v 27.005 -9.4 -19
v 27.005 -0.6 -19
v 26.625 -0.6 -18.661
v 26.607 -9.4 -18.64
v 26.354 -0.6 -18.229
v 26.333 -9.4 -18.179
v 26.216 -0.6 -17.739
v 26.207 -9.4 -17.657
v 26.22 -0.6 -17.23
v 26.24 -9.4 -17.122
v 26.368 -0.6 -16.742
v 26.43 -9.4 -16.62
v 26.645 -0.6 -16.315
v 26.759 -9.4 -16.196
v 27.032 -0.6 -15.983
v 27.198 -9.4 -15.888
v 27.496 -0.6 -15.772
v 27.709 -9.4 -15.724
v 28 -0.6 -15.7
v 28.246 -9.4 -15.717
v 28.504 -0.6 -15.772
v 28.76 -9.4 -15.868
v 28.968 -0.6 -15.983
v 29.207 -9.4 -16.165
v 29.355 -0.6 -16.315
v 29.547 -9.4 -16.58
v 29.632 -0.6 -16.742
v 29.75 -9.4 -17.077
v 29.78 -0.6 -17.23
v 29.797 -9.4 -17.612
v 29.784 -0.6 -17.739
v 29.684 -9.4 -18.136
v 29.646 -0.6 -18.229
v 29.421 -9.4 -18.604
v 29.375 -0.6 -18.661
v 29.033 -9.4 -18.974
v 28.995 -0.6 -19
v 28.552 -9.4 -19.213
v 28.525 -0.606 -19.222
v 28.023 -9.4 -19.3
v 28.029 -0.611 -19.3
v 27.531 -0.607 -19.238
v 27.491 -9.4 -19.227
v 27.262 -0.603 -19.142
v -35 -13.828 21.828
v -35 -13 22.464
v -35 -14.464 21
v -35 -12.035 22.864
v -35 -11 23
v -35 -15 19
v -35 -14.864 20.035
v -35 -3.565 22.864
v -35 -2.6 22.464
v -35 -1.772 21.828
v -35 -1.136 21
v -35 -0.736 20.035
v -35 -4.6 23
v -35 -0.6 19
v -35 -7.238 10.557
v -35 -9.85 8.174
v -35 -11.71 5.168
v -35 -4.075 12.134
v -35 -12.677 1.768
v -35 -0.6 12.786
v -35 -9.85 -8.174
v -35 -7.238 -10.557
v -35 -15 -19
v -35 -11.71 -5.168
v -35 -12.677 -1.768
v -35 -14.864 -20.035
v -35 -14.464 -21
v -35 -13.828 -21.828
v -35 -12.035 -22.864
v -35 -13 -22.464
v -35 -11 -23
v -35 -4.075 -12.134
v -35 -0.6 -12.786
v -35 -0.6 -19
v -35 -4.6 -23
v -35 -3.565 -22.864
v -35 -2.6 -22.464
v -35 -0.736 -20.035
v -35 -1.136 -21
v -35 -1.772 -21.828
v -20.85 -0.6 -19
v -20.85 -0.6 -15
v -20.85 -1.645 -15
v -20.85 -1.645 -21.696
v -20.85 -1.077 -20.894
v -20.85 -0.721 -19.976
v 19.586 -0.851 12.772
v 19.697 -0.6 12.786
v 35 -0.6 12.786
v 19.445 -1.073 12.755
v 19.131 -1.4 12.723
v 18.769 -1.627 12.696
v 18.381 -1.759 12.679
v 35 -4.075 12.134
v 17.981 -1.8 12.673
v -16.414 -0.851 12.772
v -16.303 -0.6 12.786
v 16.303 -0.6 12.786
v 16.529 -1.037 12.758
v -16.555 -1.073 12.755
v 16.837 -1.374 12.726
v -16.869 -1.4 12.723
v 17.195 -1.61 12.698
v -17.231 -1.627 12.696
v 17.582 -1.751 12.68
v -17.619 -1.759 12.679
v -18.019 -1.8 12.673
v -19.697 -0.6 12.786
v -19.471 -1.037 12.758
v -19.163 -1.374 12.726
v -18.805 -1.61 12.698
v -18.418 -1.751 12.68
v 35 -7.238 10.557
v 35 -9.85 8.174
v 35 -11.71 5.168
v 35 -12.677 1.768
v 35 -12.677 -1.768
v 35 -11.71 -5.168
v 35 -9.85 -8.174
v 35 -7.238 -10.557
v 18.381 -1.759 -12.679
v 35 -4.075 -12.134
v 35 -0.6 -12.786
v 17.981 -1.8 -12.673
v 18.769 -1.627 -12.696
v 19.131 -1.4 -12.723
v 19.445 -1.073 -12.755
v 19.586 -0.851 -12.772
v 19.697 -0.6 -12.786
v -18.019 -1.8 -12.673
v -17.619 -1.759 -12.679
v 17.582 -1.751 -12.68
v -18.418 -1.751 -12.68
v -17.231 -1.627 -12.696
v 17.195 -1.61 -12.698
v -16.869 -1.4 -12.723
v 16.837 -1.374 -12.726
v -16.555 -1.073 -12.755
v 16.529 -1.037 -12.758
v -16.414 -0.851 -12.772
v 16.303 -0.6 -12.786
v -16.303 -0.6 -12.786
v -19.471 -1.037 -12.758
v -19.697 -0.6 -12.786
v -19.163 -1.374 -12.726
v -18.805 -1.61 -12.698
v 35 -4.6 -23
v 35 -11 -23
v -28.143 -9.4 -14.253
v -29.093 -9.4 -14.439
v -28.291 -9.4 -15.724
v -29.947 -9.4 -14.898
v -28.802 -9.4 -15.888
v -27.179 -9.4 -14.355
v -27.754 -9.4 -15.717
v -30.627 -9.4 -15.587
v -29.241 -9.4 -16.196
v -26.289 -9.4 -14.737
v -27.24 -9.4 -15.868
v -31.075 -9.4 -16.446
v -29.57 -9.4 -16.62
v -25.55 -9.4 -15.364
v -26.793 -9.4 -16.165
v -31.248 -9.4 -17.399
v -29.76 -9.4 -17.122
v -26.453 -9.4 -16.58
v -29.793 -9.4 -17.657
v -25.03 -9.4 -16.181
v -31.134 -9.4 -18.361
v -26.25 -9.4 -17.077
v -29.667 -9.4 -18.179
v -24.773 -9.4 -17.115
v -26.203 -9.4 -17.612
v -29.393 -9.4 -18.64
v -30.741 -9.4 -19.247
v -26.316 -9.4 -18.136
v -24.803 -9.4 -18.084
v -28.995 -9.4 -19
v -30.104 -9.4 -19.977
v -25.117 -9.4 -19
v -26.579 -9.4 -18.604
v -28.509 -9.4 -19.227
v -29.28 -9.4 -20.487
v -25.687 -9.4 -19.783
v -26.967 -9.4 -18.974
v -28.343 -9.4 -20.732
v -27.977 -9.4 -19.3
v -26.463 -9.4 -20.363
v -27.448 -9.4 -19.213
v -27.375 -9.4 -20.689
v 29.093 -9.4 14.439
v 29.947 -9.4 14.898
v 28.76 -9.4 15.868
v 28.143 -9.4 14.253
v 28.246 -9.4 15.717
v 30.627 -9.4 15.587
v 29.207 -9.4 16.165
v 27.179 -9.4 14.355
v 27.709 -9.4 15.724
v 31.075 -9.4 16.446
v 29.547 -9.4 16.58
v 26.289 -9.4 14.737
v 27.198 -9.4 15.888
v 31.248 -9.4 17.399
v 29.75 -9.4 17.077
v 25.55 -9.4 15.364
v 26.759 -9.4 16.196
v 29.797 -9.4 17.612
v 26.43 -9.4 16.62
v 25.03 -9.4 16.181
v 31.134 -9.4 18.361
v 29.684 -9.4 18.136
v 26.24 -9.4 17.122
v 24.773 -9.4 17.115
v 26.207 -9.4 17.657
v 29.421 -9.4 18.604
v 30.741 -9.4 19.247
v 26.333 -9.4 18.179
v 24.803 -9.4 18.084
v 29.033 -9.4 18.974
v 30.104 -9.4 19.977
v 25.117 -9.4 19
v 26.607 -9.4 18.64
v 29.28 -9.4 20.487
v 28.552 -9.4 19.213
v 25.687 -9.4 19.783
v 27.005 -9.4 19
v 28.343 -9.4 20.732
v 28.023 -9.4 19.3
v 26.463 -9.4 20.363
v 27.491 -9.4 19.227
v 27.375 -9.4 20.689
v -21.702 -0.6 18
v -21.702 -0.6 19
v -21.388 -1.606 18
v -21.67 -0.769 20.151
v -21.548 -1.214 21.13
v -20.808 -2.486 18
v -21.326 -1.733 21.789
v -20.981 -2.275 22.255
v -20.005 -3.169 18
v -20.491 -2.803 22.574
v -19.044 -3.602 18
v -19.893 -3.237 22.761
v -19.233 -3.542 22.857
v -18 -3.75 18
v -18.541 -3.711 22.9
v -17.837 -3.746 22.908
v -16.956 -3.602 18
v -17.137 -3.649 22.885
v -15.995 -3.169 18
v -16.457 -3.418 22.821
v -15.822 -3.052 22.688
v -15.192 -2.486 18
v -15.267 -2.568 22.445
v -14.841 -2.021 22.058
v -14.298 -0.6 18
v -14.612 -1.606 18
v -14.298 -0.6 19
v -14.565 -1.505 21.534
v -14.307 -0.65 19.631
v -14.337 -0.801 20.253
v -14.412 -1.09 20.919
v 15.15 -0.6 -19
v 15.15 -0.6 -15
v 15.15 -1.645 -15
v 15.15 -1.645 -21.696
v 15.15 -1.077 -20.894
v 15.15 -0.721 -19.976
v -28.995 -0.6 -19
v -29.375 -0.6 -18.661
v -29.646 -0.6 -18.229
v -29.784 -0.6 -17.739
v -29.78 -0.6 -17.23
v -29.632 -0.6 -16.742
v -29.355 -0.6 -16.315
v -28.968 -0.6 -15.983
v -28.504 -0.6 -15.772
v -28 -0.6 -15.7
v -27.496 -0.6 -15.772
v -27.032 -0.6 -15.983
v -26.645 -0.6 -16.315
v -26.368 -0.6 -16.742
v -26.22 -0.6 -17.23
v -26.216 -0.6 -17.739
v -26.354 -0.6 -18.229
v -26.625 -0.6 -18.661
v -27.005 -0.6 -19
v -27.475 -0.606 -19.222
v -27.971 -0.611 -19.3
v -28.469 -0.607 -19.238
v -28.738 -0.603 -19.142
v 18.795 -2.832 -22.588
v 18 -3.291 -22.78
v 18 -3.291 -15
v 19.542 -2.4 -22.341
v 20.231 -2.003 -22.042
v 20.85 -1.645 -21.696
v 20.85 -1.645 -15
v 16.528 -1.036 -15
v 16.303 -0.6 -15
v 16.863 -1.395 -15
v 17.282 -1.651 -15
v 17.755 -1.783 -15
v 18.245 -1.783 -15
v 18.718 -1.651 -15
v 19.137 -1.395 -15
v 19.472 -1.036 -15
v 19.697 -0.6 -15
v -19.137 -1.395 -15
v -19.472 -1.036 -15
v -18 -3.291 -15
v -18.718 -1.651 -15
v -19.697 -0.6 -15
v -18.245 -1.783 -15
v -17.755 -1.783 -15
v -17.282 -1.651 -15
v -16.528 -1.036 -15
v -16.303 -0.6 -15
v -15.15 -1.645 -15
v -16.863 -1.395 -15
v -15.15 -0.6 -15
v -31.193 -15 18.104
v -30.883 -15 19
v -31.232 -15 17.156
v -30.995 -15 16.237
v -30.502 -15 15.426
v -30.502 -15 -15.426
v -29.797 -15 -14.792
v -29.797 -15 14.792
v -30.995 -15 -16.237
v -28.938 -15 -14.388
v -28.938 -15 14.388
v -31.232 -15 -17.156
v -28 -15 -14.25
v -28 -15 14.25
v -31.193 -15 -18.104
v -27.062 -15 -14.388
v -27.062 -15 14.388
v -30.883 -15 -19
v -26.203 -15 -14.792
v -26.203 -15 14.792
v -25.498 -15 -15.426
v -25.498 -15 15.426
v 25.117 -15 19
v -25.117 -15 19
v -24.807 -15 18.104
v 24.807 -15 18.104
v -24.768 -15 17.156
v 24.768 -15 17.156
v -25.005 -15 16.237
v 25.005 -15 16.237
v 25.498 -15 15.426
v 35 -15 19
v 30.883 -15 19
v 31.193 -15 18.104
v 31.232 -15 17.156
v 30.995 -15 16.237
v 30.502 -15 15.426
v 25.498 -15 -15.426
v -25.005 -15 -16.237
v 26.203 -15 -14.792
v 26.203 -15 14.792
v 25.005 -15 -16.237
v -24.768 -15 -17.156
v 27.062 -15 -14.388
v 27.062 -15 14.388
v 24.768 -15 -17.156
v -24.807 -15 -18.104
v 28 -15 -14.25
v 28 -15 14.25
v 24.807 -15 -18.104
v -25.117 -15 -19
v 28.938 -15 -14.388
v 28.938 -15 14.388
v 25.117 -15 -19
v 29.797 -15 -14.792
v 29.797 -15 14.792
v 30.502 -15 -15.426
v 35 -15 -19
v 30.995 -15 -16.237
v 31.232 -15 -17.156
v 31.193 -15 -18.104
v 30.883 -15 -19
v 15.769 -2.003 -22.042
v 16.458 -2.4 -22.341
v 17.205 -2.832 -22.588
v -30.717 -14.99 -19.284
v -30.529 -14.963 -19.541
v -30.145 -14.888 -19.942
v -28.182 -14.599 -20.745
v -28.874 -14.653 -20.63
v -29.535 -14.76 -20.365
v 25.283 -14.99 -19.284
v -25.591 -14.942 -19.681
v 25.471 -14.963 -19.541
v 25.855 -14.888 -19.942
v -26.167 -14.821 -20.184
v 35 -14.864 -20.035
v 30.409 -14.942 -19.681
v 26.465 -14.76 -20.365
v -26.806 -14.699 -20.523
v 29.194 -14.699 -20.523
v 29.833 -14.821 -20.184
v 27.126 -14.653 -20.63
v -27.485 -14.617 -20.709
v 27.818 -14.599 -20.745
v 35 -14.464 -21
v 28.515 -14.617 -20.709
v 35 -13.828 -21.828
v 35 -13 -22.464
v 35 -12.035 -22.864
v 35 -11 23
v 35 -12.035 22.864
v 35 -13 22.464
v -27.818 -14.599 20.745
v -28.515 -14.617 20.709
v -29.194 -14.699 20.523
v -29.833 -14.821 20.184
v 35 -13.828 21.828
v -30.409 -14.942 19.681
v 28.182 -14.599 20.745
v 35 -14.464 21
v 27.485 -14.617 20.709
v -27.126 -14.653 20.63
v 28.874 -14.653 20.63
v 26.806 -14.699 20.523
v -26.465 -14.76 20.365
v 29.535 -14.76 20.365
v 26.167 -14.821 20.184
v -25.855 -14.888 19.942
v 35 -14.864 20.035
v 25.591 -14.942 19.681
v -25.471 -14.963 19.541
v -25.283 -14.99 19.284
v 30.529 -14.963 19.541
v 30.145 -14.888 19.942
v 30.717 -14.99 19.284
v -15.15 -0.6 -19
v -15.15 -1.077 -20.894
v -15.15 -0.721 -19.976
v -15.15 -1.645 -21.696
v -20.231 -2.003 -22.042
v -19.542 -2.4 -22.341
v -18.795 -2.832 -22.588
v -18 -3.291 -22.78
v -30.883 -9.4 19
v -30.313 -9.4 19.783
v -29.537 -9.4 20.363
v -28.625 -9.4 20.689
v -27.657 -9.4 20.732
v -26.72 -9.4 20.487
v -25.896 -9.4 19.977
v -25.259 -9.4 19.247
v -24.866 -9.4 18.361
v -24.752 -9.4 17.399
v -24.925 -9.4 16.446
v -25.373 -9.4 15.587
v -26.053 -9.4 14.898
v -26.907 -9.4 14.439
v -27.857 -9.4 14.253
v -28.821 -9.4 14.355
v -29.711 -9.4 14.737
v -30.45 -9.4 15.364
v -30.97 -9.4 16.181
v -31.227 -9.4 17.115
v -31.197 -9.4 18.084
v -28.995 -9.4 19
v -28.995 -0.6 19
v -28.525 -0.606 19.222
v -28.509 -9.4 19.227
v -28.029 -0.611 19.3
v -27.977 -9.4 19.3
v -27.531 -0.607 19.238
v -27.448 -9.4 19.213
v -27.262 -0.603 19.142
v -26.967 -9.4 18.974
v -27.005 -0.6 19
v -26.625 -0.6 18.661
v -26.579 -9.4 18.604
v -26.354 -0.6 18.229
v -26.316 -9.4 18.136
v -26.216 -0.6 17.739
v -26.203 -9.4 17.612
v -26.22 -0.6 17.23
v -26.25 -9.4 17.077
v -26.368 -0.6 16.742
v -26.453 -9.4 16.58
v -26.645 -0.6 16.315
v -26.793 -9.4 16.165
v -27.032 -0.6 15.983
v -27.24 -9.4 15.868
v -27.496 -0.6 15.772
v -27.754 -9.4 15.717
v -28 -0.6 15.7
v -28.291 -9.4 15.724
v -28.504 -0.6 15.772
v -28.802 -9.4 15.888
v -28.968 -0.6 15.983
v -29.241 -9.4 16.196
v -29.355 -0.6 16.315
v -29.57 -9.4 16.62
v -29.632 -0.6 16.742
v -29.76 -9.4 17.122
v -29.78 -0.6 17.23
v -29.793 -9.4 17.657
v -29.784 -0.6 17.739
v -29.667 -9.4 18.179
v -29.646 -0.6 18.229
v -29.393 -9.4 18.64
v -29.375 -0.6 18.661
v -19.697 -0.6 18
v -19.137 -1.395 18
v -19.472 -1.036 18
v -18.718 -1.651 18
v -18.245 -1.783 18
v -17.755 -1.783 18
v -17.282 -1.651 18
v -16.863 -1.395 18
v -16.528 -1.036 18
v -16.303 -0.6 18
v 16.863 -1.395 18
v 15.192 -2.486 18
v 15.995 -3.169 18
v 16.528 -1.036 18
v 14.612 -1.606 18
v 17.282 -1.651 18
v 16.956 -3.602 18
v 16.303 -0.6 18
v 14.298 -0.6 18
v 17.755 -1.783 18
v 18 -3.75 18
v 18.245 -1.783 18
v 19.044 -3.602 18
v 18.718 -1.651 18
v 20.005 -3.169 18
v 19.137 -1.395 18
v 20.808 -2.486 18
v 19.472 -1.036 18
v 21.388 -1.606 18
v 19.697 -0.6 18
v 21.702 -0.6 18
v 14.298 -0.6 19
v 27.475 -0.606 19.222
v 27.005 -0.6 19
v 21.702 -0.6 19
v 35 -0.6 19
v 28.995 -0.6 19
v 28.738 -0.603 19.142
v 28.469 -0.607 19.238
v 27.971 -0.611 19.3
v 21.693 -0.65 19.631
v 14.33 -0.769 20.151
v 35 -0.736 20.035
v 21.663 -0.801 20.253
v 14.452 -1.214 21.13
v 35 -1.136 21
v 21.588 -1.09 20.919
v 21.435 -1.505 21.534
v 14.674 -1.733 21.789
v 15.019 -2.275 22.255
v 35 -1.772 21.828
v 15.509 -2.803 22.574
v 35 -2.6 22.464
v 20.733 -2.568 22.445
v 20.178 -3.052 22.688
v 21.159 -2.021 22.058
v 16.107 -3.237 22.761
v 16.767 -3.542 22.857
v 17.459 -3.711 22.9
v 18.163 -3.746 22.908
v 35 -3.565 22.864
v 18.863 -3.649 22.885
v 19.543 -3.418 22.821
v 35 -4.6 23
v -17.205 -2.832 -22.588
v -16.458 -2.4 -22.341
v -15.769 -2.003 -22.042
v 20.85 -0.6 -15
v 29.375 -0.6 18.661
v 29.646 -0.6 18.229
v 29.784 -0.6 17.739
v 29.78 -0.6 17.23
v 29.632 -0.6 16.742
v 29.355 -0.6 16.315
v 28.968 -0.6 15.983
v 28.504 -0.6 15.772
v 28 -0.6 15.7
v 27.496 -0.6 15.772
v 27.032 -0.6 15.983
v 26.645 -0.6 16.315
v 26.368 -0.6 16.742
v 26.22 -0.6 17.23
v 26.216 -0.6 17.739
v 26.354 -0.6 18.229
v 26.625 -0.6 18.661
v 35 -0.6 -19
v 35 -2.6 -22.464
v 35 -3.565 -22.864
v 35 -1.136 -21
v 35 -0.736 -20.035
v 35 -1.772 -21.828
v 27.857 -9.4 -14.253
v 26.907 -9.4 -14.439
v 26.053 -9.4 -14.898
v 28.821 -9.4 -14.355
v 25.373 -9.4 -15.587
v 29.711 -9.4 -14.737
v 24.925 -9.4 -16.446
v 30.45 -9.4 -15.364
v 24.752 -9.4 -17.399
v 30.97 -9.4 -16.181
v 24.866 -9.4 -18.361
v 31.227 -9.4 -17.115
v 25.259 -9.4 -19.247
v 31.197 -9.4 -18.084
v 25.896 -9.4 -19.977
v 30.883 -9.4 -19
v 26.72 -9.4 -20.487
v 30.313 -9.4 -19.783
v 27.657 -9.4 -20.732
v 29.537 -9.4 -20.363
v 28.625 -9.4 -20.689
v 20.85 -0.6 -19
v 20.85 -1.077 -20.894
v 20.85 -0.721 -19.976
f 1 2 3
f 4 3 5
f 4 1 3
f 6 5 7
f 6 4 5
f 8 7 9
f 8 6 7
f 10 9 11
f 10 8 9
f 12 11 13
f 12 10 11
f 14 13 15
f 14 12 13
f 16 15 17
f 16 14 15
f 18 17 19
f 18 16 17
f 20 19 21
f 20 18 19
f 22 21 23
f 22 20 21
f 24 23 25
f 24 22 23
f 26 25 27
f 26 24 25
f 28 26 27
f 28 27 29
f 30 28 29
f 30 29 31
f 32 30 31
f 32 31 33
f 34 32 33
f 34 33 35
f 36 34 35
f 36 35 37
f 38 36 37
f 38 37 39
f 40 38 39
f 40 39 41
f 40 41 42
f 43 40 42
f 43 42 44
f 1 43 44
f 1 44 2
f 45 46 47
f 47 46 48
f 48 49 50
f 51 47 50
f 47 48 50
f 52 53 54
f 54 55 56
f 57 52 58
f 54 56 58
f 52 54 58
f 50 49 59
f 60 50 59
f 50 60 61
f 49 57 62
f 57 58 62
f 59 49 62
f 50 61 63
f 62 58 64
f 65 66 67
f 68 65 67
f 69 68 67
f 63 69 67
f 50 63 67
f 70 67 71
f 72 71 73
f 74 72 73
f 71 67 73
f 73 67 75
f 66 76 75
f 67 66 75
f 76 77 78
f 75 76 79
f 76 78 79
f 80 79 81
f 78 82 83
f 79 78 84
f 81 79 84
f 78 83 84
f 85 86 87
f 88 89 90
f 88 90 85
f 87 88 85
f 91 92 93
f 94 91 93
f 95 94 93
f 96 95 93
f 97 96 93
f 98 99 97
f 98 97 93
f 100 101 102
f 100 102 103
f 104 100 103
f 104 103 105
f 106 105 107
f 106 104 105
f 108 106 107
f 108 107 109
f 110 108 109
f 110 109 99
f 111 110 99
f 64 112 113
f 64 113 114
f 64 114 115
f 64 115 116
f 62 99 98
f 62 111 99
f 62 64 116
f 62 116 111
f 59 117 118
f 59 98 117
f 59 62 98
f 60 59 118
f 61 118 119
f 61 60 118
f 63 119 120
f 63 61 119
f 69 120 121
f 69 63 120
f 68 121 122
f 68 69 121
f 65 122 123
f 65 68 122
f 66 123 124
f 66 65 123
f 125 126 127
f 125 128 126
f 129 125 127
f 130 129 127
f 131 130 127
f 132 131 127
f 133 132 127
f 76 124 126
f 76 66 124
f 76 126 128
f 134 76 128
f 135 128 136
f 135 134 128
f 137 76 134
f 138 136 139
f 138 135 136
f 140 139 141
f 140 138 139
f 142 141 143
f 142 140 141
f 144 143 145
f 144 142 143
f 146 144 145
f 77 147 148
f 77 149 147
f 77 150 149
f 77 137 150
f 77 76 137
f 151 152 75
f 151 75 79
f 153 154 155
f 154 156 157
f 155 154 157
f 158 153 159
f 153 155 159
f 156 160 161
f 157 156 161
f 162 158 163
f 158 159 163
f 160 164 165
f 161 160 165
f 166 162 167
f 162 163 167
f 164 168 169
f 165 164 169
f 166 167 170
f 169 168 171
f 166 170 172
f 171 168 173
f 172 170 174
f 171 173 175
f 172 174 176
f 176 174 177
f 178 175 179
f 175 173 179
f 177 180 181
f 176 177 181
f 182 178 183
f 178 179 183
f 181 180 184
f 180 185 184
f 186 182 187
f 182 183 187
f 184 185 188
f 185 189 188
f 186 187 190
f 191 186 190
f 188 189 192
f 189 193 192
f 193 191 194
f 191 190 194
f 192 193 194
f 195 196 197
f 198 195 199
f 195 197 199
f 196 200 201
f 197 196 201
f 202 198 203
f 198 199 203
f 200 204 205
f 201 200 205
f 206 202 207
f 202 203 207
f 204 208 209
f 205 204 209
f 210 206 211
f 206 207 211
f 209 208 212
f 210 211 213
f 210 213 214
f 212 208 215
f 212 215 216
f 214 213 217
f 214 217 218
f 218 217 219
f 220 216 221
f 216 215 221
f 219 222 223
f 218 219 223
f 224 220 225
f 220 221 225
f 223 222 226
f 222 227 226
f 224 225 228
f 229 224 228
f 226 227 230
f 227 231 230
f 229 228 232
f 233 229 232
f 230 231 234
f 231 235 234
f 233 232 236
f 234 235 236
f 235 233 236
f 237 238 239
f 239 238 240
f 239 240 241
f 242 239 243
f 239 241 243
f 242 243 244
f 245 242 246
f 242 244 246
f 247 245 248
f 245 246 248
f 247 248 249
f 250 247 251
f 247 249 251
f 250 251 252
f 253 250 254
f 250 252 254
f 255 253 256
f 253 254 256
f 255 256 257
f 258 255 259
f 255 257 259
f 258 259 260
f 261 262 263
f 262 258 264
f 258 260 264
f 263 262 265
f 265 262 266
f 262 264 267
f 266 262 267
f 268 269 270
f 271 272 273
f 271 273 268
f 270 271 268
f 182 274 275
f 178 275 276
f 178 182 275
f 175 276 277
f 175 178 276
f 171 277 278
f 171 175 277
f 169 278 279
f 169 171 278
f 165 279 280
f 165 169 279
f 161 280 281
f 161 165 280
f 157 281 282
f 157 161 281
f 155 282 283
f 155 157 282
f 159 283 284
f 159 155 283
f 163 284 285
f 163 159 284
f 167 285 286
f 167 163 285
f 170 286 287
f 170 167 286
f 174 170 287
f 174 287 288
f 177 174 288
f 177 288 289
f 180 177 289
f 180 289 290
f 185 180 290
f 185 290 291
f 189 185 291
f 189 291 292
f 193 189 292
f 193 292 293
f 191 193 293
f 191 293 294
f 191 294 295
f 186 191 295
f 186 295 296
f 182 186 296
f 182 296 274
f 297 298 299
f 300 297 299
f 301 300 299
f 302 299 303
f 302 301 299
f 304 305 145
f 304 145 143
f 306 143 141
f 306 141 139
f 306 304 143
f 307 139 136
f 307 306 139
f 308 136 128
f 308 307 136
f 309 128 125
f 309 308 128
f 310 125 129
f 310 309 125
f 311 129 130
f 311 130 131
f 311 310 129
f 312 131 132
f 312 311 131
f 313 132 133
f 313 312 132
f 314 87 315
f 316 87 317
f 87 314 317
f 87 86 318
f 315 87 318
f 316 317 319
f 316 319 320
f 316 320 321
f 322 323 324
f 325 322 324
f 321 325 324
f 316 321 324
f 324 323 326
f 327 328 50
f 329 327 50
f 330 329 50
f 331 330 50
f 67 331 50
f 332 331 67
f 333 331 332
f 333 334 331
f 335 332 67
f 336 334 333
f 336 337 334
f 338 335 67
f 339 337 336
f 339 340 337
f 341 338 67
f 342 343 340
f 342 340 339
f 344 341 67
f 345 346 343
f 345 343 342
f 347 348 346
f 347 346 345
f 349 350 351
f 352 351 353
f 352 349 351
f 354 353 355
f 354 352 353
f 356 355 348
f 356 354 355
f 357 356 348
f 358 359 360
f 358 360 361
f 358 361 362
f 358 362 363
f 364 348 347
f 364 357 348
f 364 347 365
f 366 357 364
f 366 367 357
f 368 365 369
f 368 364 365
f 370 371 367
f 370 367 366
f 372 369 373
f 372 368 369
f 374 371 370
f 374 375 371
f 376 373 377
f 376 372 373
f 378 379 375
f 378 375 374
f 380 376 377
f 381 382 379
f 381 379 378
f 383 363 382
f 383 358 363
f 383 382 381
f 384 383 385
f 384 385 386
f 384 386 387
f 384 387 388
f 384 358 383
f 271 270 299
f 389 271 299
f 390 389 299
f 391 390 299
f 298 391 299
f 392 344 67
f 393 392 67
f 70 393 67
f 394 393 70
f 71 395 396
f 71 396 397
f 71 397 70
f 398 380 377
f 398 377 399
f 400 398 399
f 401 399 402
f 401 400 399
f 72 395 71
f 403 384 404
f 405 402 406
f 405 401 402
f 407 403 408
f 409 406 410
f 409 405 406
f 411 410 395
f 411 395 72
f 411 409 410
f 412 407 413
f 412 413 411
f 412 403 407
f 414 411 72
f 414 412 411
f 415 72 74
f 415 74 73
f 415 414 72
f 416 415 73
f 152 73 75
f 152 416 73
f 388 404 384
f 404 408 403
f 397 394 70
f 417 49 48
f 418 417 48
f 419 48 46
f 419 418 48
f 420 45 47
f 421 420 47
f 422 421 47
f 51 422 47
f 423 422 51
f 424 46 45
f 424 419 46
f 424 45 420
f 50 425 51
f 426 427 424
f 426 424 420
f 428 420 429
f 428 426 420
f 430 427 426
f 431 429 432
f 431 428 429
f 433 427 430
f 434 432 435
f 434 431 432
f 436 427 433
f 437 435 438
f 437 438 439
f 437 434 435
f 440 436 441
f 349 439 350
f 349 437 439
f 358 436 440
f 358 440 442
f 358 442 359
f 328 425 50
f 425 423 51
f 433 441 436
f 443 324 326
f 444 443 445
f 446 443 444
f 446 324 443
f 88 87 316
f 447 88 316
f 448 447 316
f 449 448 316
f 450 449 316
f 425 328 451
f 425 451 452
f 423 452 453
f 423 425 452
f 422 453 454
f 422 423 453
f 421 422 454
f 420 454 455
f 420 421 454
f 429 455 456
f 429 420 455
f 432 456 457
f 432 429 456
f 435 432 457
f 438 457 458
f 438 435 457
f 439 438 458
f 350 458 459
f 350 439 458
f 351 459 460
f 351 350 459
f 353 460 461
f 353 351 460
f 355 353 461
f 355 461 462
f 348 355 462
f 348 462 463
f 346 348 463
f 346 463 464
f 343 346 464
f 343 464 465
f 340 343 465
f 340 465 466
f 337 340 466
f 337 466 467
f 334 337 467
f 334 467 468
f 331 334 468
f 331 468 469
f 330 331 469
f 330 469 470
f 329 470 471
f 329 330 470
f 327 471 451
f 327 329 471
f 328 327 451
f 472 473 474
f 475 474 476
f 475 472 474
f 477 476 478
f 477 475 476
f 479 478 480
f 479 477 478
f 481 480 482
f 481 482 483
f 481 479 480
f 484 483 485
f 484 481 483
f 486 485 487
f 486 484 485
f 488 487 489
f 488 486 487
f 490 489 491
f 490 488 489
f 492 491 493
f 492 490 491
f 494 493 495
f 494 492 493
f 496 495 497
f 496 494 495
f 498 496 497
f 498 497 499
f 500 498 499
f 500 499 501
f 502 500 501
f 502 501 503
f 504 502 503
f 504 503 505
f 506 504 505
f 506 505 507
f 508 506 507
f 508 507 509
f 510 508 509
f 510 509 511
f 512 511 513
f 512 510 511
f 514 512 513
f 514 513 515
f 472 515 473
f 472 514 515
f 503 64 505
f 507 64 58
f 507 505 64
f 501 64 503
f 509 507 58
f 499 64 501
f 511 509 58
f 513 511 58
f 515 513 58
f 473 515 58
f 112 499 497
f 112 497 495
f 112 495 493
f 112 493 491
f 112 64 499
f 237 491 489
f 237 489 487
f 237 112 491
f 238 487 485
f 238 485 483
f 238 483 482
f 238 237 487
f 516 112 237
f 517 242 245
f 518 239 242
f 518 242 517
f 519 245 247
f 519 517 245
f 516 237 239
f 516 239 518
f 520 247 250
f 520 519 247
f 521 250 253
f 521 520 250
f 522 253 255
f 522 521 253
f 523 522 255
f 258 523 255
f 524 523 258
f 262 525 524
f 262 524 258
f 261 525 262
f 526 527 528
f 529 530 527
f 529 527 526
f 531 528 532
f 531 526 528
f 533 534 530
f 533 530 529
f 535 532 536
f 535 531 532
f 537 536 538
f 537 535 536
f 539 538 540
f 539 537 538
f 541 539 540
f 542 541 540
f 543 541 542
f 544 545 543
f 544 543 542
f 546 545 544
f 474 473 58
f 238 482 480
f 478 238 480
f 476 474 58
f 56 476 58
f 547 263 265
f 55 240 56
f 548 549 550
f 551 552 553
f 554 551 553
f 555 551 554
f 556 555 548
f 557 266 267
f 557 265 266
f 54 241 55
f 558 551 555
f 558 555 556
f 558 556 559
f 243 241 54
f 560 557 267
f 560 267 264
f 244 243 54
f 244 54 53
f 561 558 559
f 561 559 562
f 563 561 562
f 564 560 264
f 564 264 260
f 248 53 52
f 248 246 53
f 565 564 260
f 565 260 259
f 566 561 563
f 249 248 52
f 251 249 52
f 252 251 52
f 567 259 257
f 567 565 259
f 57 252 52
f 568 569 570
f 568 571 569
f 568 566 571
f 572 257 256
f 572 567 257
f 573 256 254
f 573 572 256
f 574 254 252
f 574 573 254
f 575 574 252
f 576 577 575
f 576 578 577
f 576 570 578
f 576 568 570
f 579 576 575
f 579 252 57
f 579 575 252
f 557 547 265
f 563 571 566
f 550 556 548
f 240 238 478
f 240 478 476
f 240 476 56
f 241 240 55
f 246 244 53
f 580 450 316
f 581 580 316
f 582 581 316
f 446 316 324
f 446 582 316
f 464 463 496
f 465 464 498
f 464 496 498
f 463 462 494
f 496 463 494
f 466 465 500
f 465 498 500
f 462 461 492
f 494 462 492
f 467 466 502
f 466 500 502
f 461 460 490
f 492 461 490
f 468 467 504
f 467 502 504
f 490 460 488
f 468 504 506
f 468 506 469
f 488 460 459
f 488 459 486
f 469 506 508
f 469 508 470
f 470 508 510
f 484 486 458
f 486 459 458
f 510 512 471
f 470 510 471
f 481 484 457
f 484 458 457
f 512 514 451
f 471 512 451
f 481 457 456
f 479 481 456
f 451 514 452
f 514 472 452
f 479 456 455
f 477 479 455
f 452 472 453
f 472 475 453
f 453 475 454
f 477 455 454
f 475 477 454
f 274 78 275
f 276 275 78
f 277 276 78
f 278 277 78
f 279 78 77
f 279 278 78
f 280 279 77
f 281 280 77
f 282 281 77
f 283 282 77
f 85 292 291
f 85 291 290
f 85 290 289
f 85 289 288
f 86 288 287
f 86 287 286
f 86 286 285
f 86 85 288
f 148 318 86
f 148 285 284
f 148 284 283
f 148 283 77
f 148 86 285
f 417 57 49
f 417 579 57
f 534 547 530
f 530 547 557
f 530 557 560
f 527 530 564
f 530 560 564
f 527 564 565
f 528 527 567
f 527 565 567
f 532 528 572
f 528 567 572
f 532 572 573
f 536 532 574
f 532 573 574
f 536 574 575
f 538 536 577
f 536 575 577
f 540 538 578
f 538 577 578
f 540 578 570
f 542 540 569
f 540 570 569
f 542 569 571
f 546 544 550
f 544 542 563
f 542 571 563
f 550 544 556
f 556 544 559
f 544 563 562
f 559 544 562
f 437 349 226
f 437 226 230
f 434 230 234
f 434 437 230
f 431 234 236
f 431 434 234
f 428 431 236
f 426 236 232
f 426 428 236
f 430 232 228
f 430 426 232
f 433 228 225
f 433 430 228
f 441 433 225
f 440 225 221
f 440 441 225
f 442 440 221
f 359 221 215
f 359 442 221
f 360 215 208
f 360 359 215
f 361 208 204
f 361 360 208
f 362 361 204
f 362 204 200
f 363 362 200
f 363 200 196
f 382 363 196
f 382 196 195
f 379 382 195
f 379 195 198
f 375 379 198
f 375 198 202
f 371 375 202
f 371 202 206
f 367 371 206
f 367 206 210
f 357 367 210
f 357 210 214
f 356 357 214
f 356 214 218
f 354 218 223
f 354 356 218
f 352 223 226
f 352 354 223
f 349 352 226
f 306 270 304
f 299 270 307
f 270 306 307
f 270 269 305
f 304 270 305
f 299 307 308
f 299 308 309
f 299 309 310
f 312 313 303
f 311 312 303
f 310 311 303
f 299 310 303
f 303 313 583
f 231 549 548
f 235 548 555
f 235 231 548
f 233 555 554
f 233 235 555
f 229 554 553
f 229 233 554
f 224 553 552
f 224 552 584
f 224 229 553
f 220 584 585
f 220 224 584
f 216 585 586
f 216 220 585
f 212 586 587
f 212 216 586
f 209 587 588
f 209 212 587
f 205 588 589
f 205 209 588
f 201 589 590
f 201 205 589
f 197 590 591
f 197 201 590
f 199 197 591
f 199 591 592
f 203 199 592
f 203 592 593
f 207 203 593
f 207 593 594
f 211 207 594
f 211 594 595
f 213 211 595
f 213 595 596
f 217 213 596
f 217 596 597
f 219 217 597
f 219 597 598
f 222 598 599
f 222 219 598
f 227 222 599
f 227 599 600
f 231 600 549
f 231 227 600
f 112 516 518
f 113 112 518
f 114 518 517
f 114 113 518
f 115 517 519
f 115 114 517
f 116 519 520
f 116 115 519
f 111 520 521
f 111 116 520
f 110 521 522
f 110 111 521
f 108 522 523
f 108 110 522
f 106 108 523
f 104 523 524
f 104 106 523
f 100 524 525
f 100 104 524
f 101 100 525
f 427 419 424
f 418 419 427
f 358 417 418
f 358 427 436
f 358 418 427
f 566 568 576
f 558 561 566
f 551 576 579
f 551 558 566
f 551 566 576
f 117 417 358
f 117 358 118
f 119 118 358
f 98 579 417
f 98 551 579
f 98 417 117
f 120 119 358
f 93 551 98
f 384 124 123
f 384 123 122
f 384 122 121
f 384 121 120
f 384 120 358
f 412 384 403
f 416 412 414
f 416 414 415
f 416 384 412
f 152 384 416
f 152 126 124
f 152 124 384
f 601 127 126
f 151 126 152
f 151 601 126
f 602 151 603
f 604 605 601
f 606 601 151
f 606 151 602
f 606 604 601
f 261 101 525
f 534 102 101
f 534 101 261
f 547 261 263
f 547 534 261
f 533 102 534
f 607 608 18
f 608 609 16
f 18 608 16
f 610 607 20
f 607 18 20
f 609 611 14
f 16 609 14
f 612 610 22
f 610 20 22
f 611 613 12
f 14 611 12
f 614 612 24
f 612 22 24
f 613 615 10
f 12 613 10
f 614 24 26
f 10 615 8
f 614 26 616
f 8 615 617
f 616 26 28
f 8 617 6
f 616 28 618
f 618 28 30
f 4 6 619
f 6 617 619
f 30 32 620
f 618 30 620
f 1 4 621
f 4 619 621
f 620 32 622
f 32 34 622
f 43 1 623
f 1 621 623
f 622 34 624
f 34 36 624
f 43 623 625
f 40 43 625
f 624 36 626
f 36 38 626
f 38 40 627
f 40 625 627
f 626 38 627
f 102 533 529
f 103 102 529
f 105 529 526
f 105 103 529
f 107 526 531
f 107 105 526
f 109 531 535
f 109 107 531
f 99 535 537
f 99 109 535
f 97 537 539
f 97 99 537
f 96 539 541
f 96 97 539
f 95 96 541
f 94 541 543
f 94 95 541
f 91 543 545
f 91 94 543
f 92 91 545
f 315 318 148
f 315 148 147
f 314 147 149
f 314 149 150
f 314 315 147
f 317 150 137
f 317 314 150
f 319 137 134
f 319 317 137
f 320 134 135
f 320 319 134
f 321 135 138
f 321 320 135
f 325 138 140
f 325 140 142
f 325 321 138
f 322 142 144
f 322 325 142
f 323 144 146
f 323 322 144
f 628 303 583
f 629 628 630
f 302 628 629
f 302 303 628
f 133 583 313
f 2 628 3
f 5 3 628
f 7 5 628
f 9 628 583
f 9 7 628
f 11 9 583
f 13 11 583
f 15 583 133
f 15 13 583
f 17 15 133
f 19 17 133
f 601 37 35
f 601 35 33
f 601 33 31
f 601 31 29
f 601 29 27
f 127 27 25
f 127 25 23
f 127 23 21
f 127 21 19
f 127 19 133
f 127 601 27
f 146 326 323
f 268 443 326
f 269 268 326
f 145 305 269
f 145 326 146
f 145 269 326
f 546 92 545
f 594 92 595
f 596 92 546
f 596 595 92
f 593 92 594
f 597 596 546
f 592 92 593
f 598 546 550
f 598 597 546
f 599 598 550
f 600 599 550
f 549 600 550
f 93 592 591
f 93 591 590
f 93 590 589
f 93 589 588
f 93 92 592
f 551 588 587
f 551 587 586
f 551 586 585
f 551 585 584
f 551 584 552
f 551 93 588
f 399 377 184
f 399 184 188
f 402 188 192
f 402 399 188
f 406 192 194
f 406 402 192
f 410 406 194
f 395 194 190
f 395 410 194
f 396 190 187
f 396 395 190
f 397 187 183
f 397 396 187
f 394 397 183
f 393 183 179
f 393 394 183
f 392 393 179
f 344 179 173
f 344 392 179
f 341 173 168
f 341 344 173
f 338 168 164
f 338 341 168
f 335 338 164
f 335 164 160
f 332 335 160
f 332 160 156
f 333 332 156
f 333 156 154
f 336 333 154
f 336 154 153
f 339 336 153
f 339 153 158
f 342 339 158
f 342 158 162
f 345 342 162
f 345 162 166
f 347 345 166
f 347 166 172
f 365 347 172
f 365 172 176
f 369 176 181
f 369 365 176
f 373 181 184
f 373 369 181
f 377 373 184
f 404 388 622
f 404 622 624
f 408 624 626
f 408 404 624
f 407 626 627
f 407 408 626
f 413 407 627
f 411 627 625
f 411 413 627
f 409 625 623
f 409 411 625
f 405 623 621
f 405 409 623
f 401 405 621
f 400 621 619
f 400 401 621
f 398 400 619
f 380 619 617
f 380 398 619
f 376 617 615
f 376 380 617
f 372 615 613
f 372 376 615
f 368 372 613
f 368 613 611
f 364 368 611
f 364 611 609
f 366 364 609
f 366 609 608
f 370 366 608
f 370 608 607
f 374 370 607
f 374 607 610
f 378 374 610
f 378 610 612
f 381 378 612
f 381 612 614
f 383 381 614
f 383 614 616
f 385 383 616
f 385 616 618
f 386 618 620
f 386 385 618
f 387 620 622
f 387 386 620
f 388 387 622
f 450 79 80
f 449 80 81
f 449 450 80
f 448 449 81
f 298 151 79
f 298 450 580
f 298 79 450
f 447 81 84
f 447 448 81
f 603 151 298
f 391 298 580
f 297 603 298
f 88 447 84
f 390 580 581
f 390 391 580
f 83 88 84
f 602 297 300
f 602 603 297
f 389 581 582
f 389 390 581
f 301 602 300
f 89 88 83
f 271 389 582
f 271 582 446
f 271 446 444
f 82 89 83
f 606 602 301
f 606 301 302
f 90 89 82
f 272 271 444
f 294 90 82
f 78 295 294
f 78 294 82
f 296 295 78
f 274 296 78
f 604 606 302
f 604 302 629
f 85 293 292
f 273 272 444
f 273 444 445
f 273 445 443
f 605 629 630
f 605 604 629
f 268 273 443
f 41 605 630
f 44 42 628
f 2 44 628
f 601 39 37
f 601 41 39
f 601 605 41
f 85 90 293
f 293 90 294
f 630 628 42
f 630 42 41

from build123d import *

# Parameters (mm, degrees)
BOSS_EXTRUDE1_DEPTH     = 35
CUT_EXTRUDE1_DEPTH      = 45.485952839
CUT_EXTRUDE1_DEPTH_BACK = 45.485952839
SKETCH2_R               = 12.8
SKETCH3_R               = 1.8
CUT_EXTRUDE2_DEPTH      = 16
SKETCH4_R               = 3.25
CUT_EXTRUDE3_DEPTH      = 5.6
CUT_EXTRUDE4_DEPTH      = 45.485953003
CUT_EXTRUDE4_DEPTH_BACK = 45.485953003
SKETCH5_R               = 1.8
SKETCH6_R               = 3.75
CUT_EXTRUDE5_DEPTH      = 5
CUT_EXTRUDE6_DEPTH      = 8


with BuildPart() as part:
    # Sketch1 → Boss-Extrude1 (new, symmetric)
    with BuildSketch(Plane(origin=(0, 0, 0), x_dir=(0, 0, -1), z_dir=(1, 0, 0))):
        with BuildLine():
            Line((-19, -15), (19, -15))
            ThreePointArc((19, -15), (21.828427125, -13.828427125), (23, -11))
            Line((23, -11), (23, -4.6))
            ThreePointArc((23, -4.6), (21.828427125, -1.771572875), (19, -0.6))
            Line((19, -0.6), (-19, -0.6))
            ThreePointArc((-19, -0.6), (-21.828427125, -1.771572875), (-23, -4.6))
            Line((-23, -4.6), (-23, -11))
            ThreePointArc((-23, -11), (-21.828427125, -13.828427125), (-19, -15))
        make_face()
    extrude(amount=BOSS_EXTRUDE1_DEPTH, both=True)

    # Sketch2 → Cut-Extrude1 (cut, two sides: drawn at the far end of the back side and taken through both)
    with BuildSketch(Plane(origin=(0, 0, 0), x_dir=(0, 0, -1), z_dir=(1, 0, 0)).offset(-CUT_EXTRUDE1_DEPTH_BACK)):
        Circle(SKETCH2_R)
    extrude(amount=CUT_EXTRUDE1_DEPTH + CUT_EXTRUDE1_DEPTH_BACK, mode=Mode.SUBTRACT)

    # Sketch3 → Cut-Extrude2 (cut)
    with BuildSketch(Plane(origin=(0, -15, 0), x_dir=(1, 0, 0), z_dir=(0, 1, 0))):
        with Locations(Location((28, -17.5, 0), (0, 0, 236.442690238))):
            Circle(SKETCH3_R)
        with Locations(Location((28, 17.5, 0), (0, 0, 123.557309762))):
            Circle(SKETCH3_R)
        with Locations(Location((-28, -17.5, 0), (0, 0, 236.442690238))):
            Circle(SKETCH3_R)
        with Locations(Location((-28, 17.5, 0), (0, 0, 123.557309762))):
            Circle(SKETCH3_R)
    extrude(amount=CUT_EXTRUDE2_DEPTH, mode=Mode.SUBTRACT)

    # Sketch4 → Cut-Extrude3 (cut)
    with BuildSketch(Plane(origin=(0, -15, 0), x_dir=(1, 0, 0), z_dir=(0, 1, 0))):
        with Locations(Location((28, -17.5, 0), (0, 0, 207.48642625))):
            Circle(SKETCH4_R)
        with Locations(Location((28, 17.5, 0), (0, 0, 27.48642625))):
            Circle(SKETCH4_R)
        with Locations(Location((-28, -17.5, 0), (0, 0, 207.48642625))):
            Circle(SKETCH4_R)
        with Locations(Location((-28, 17.5, 0), (0, 0, 27.48642625))):
            Circle(SKETCH4_R)
    extrude(amount=CUT_EXTRUDE3_DEPTH, mode=Mode.SUBTRACT)

    # Sketch5 → Cut-Extrude4 (cut, two sides: drawn at the far end of the back side and taken through both)
    with BuildSketch(Plane.XY.offset(-CUT_EXTRUDE4_DEPTH_BACK)):
        with Locations((18, 0)):
            Circle(SKETCH5_R)
        with Locations((-18, 0)):
            Circle(SKETCH5_R)
    extrude(amount=CUT_EXTRUDE4_DEPTH + CUT_EXTRUDE4_DEPTH_BACK, mode=Mode.SUBTRACT)

    # Sketch6 → Cut-Extrude5 (cut)
    with BuildSketch(Plane.XY.offset(23)):
        with Locations((18, 0)):
            Circle(SKETCH6_R)
        with Locations((-18, 0)):
            Circle(SKETCH6_R)
    extrude(amount=-CUT_EXTRUDE5_DEPTH, mode=Mode.SUBTRACT)

    # Sketch7 → Cut-Extrude6 (cut)
    with BuildSketch(Plane.XY.offset(-23)):
        Polygon((20.85, 1.645448267), (18, 3.290896534), (15.15, 1.645448267), (15.15, -1.645448267), (18, -3.290896534), (20.85, -1.645448267), align=None)
        Polygon((-15.15, 1.645448267), (-18, 3.290896534), (-20.85, 1.645448267), (-20.85, -1.645448267), (-18, -3.290896534), (-15.15, -1.645448267), align=None)
    extrude(amount=CUT_EXTRUDE6_DEPTH, mode=Mode.SUBTRACT)


solid = part.part
